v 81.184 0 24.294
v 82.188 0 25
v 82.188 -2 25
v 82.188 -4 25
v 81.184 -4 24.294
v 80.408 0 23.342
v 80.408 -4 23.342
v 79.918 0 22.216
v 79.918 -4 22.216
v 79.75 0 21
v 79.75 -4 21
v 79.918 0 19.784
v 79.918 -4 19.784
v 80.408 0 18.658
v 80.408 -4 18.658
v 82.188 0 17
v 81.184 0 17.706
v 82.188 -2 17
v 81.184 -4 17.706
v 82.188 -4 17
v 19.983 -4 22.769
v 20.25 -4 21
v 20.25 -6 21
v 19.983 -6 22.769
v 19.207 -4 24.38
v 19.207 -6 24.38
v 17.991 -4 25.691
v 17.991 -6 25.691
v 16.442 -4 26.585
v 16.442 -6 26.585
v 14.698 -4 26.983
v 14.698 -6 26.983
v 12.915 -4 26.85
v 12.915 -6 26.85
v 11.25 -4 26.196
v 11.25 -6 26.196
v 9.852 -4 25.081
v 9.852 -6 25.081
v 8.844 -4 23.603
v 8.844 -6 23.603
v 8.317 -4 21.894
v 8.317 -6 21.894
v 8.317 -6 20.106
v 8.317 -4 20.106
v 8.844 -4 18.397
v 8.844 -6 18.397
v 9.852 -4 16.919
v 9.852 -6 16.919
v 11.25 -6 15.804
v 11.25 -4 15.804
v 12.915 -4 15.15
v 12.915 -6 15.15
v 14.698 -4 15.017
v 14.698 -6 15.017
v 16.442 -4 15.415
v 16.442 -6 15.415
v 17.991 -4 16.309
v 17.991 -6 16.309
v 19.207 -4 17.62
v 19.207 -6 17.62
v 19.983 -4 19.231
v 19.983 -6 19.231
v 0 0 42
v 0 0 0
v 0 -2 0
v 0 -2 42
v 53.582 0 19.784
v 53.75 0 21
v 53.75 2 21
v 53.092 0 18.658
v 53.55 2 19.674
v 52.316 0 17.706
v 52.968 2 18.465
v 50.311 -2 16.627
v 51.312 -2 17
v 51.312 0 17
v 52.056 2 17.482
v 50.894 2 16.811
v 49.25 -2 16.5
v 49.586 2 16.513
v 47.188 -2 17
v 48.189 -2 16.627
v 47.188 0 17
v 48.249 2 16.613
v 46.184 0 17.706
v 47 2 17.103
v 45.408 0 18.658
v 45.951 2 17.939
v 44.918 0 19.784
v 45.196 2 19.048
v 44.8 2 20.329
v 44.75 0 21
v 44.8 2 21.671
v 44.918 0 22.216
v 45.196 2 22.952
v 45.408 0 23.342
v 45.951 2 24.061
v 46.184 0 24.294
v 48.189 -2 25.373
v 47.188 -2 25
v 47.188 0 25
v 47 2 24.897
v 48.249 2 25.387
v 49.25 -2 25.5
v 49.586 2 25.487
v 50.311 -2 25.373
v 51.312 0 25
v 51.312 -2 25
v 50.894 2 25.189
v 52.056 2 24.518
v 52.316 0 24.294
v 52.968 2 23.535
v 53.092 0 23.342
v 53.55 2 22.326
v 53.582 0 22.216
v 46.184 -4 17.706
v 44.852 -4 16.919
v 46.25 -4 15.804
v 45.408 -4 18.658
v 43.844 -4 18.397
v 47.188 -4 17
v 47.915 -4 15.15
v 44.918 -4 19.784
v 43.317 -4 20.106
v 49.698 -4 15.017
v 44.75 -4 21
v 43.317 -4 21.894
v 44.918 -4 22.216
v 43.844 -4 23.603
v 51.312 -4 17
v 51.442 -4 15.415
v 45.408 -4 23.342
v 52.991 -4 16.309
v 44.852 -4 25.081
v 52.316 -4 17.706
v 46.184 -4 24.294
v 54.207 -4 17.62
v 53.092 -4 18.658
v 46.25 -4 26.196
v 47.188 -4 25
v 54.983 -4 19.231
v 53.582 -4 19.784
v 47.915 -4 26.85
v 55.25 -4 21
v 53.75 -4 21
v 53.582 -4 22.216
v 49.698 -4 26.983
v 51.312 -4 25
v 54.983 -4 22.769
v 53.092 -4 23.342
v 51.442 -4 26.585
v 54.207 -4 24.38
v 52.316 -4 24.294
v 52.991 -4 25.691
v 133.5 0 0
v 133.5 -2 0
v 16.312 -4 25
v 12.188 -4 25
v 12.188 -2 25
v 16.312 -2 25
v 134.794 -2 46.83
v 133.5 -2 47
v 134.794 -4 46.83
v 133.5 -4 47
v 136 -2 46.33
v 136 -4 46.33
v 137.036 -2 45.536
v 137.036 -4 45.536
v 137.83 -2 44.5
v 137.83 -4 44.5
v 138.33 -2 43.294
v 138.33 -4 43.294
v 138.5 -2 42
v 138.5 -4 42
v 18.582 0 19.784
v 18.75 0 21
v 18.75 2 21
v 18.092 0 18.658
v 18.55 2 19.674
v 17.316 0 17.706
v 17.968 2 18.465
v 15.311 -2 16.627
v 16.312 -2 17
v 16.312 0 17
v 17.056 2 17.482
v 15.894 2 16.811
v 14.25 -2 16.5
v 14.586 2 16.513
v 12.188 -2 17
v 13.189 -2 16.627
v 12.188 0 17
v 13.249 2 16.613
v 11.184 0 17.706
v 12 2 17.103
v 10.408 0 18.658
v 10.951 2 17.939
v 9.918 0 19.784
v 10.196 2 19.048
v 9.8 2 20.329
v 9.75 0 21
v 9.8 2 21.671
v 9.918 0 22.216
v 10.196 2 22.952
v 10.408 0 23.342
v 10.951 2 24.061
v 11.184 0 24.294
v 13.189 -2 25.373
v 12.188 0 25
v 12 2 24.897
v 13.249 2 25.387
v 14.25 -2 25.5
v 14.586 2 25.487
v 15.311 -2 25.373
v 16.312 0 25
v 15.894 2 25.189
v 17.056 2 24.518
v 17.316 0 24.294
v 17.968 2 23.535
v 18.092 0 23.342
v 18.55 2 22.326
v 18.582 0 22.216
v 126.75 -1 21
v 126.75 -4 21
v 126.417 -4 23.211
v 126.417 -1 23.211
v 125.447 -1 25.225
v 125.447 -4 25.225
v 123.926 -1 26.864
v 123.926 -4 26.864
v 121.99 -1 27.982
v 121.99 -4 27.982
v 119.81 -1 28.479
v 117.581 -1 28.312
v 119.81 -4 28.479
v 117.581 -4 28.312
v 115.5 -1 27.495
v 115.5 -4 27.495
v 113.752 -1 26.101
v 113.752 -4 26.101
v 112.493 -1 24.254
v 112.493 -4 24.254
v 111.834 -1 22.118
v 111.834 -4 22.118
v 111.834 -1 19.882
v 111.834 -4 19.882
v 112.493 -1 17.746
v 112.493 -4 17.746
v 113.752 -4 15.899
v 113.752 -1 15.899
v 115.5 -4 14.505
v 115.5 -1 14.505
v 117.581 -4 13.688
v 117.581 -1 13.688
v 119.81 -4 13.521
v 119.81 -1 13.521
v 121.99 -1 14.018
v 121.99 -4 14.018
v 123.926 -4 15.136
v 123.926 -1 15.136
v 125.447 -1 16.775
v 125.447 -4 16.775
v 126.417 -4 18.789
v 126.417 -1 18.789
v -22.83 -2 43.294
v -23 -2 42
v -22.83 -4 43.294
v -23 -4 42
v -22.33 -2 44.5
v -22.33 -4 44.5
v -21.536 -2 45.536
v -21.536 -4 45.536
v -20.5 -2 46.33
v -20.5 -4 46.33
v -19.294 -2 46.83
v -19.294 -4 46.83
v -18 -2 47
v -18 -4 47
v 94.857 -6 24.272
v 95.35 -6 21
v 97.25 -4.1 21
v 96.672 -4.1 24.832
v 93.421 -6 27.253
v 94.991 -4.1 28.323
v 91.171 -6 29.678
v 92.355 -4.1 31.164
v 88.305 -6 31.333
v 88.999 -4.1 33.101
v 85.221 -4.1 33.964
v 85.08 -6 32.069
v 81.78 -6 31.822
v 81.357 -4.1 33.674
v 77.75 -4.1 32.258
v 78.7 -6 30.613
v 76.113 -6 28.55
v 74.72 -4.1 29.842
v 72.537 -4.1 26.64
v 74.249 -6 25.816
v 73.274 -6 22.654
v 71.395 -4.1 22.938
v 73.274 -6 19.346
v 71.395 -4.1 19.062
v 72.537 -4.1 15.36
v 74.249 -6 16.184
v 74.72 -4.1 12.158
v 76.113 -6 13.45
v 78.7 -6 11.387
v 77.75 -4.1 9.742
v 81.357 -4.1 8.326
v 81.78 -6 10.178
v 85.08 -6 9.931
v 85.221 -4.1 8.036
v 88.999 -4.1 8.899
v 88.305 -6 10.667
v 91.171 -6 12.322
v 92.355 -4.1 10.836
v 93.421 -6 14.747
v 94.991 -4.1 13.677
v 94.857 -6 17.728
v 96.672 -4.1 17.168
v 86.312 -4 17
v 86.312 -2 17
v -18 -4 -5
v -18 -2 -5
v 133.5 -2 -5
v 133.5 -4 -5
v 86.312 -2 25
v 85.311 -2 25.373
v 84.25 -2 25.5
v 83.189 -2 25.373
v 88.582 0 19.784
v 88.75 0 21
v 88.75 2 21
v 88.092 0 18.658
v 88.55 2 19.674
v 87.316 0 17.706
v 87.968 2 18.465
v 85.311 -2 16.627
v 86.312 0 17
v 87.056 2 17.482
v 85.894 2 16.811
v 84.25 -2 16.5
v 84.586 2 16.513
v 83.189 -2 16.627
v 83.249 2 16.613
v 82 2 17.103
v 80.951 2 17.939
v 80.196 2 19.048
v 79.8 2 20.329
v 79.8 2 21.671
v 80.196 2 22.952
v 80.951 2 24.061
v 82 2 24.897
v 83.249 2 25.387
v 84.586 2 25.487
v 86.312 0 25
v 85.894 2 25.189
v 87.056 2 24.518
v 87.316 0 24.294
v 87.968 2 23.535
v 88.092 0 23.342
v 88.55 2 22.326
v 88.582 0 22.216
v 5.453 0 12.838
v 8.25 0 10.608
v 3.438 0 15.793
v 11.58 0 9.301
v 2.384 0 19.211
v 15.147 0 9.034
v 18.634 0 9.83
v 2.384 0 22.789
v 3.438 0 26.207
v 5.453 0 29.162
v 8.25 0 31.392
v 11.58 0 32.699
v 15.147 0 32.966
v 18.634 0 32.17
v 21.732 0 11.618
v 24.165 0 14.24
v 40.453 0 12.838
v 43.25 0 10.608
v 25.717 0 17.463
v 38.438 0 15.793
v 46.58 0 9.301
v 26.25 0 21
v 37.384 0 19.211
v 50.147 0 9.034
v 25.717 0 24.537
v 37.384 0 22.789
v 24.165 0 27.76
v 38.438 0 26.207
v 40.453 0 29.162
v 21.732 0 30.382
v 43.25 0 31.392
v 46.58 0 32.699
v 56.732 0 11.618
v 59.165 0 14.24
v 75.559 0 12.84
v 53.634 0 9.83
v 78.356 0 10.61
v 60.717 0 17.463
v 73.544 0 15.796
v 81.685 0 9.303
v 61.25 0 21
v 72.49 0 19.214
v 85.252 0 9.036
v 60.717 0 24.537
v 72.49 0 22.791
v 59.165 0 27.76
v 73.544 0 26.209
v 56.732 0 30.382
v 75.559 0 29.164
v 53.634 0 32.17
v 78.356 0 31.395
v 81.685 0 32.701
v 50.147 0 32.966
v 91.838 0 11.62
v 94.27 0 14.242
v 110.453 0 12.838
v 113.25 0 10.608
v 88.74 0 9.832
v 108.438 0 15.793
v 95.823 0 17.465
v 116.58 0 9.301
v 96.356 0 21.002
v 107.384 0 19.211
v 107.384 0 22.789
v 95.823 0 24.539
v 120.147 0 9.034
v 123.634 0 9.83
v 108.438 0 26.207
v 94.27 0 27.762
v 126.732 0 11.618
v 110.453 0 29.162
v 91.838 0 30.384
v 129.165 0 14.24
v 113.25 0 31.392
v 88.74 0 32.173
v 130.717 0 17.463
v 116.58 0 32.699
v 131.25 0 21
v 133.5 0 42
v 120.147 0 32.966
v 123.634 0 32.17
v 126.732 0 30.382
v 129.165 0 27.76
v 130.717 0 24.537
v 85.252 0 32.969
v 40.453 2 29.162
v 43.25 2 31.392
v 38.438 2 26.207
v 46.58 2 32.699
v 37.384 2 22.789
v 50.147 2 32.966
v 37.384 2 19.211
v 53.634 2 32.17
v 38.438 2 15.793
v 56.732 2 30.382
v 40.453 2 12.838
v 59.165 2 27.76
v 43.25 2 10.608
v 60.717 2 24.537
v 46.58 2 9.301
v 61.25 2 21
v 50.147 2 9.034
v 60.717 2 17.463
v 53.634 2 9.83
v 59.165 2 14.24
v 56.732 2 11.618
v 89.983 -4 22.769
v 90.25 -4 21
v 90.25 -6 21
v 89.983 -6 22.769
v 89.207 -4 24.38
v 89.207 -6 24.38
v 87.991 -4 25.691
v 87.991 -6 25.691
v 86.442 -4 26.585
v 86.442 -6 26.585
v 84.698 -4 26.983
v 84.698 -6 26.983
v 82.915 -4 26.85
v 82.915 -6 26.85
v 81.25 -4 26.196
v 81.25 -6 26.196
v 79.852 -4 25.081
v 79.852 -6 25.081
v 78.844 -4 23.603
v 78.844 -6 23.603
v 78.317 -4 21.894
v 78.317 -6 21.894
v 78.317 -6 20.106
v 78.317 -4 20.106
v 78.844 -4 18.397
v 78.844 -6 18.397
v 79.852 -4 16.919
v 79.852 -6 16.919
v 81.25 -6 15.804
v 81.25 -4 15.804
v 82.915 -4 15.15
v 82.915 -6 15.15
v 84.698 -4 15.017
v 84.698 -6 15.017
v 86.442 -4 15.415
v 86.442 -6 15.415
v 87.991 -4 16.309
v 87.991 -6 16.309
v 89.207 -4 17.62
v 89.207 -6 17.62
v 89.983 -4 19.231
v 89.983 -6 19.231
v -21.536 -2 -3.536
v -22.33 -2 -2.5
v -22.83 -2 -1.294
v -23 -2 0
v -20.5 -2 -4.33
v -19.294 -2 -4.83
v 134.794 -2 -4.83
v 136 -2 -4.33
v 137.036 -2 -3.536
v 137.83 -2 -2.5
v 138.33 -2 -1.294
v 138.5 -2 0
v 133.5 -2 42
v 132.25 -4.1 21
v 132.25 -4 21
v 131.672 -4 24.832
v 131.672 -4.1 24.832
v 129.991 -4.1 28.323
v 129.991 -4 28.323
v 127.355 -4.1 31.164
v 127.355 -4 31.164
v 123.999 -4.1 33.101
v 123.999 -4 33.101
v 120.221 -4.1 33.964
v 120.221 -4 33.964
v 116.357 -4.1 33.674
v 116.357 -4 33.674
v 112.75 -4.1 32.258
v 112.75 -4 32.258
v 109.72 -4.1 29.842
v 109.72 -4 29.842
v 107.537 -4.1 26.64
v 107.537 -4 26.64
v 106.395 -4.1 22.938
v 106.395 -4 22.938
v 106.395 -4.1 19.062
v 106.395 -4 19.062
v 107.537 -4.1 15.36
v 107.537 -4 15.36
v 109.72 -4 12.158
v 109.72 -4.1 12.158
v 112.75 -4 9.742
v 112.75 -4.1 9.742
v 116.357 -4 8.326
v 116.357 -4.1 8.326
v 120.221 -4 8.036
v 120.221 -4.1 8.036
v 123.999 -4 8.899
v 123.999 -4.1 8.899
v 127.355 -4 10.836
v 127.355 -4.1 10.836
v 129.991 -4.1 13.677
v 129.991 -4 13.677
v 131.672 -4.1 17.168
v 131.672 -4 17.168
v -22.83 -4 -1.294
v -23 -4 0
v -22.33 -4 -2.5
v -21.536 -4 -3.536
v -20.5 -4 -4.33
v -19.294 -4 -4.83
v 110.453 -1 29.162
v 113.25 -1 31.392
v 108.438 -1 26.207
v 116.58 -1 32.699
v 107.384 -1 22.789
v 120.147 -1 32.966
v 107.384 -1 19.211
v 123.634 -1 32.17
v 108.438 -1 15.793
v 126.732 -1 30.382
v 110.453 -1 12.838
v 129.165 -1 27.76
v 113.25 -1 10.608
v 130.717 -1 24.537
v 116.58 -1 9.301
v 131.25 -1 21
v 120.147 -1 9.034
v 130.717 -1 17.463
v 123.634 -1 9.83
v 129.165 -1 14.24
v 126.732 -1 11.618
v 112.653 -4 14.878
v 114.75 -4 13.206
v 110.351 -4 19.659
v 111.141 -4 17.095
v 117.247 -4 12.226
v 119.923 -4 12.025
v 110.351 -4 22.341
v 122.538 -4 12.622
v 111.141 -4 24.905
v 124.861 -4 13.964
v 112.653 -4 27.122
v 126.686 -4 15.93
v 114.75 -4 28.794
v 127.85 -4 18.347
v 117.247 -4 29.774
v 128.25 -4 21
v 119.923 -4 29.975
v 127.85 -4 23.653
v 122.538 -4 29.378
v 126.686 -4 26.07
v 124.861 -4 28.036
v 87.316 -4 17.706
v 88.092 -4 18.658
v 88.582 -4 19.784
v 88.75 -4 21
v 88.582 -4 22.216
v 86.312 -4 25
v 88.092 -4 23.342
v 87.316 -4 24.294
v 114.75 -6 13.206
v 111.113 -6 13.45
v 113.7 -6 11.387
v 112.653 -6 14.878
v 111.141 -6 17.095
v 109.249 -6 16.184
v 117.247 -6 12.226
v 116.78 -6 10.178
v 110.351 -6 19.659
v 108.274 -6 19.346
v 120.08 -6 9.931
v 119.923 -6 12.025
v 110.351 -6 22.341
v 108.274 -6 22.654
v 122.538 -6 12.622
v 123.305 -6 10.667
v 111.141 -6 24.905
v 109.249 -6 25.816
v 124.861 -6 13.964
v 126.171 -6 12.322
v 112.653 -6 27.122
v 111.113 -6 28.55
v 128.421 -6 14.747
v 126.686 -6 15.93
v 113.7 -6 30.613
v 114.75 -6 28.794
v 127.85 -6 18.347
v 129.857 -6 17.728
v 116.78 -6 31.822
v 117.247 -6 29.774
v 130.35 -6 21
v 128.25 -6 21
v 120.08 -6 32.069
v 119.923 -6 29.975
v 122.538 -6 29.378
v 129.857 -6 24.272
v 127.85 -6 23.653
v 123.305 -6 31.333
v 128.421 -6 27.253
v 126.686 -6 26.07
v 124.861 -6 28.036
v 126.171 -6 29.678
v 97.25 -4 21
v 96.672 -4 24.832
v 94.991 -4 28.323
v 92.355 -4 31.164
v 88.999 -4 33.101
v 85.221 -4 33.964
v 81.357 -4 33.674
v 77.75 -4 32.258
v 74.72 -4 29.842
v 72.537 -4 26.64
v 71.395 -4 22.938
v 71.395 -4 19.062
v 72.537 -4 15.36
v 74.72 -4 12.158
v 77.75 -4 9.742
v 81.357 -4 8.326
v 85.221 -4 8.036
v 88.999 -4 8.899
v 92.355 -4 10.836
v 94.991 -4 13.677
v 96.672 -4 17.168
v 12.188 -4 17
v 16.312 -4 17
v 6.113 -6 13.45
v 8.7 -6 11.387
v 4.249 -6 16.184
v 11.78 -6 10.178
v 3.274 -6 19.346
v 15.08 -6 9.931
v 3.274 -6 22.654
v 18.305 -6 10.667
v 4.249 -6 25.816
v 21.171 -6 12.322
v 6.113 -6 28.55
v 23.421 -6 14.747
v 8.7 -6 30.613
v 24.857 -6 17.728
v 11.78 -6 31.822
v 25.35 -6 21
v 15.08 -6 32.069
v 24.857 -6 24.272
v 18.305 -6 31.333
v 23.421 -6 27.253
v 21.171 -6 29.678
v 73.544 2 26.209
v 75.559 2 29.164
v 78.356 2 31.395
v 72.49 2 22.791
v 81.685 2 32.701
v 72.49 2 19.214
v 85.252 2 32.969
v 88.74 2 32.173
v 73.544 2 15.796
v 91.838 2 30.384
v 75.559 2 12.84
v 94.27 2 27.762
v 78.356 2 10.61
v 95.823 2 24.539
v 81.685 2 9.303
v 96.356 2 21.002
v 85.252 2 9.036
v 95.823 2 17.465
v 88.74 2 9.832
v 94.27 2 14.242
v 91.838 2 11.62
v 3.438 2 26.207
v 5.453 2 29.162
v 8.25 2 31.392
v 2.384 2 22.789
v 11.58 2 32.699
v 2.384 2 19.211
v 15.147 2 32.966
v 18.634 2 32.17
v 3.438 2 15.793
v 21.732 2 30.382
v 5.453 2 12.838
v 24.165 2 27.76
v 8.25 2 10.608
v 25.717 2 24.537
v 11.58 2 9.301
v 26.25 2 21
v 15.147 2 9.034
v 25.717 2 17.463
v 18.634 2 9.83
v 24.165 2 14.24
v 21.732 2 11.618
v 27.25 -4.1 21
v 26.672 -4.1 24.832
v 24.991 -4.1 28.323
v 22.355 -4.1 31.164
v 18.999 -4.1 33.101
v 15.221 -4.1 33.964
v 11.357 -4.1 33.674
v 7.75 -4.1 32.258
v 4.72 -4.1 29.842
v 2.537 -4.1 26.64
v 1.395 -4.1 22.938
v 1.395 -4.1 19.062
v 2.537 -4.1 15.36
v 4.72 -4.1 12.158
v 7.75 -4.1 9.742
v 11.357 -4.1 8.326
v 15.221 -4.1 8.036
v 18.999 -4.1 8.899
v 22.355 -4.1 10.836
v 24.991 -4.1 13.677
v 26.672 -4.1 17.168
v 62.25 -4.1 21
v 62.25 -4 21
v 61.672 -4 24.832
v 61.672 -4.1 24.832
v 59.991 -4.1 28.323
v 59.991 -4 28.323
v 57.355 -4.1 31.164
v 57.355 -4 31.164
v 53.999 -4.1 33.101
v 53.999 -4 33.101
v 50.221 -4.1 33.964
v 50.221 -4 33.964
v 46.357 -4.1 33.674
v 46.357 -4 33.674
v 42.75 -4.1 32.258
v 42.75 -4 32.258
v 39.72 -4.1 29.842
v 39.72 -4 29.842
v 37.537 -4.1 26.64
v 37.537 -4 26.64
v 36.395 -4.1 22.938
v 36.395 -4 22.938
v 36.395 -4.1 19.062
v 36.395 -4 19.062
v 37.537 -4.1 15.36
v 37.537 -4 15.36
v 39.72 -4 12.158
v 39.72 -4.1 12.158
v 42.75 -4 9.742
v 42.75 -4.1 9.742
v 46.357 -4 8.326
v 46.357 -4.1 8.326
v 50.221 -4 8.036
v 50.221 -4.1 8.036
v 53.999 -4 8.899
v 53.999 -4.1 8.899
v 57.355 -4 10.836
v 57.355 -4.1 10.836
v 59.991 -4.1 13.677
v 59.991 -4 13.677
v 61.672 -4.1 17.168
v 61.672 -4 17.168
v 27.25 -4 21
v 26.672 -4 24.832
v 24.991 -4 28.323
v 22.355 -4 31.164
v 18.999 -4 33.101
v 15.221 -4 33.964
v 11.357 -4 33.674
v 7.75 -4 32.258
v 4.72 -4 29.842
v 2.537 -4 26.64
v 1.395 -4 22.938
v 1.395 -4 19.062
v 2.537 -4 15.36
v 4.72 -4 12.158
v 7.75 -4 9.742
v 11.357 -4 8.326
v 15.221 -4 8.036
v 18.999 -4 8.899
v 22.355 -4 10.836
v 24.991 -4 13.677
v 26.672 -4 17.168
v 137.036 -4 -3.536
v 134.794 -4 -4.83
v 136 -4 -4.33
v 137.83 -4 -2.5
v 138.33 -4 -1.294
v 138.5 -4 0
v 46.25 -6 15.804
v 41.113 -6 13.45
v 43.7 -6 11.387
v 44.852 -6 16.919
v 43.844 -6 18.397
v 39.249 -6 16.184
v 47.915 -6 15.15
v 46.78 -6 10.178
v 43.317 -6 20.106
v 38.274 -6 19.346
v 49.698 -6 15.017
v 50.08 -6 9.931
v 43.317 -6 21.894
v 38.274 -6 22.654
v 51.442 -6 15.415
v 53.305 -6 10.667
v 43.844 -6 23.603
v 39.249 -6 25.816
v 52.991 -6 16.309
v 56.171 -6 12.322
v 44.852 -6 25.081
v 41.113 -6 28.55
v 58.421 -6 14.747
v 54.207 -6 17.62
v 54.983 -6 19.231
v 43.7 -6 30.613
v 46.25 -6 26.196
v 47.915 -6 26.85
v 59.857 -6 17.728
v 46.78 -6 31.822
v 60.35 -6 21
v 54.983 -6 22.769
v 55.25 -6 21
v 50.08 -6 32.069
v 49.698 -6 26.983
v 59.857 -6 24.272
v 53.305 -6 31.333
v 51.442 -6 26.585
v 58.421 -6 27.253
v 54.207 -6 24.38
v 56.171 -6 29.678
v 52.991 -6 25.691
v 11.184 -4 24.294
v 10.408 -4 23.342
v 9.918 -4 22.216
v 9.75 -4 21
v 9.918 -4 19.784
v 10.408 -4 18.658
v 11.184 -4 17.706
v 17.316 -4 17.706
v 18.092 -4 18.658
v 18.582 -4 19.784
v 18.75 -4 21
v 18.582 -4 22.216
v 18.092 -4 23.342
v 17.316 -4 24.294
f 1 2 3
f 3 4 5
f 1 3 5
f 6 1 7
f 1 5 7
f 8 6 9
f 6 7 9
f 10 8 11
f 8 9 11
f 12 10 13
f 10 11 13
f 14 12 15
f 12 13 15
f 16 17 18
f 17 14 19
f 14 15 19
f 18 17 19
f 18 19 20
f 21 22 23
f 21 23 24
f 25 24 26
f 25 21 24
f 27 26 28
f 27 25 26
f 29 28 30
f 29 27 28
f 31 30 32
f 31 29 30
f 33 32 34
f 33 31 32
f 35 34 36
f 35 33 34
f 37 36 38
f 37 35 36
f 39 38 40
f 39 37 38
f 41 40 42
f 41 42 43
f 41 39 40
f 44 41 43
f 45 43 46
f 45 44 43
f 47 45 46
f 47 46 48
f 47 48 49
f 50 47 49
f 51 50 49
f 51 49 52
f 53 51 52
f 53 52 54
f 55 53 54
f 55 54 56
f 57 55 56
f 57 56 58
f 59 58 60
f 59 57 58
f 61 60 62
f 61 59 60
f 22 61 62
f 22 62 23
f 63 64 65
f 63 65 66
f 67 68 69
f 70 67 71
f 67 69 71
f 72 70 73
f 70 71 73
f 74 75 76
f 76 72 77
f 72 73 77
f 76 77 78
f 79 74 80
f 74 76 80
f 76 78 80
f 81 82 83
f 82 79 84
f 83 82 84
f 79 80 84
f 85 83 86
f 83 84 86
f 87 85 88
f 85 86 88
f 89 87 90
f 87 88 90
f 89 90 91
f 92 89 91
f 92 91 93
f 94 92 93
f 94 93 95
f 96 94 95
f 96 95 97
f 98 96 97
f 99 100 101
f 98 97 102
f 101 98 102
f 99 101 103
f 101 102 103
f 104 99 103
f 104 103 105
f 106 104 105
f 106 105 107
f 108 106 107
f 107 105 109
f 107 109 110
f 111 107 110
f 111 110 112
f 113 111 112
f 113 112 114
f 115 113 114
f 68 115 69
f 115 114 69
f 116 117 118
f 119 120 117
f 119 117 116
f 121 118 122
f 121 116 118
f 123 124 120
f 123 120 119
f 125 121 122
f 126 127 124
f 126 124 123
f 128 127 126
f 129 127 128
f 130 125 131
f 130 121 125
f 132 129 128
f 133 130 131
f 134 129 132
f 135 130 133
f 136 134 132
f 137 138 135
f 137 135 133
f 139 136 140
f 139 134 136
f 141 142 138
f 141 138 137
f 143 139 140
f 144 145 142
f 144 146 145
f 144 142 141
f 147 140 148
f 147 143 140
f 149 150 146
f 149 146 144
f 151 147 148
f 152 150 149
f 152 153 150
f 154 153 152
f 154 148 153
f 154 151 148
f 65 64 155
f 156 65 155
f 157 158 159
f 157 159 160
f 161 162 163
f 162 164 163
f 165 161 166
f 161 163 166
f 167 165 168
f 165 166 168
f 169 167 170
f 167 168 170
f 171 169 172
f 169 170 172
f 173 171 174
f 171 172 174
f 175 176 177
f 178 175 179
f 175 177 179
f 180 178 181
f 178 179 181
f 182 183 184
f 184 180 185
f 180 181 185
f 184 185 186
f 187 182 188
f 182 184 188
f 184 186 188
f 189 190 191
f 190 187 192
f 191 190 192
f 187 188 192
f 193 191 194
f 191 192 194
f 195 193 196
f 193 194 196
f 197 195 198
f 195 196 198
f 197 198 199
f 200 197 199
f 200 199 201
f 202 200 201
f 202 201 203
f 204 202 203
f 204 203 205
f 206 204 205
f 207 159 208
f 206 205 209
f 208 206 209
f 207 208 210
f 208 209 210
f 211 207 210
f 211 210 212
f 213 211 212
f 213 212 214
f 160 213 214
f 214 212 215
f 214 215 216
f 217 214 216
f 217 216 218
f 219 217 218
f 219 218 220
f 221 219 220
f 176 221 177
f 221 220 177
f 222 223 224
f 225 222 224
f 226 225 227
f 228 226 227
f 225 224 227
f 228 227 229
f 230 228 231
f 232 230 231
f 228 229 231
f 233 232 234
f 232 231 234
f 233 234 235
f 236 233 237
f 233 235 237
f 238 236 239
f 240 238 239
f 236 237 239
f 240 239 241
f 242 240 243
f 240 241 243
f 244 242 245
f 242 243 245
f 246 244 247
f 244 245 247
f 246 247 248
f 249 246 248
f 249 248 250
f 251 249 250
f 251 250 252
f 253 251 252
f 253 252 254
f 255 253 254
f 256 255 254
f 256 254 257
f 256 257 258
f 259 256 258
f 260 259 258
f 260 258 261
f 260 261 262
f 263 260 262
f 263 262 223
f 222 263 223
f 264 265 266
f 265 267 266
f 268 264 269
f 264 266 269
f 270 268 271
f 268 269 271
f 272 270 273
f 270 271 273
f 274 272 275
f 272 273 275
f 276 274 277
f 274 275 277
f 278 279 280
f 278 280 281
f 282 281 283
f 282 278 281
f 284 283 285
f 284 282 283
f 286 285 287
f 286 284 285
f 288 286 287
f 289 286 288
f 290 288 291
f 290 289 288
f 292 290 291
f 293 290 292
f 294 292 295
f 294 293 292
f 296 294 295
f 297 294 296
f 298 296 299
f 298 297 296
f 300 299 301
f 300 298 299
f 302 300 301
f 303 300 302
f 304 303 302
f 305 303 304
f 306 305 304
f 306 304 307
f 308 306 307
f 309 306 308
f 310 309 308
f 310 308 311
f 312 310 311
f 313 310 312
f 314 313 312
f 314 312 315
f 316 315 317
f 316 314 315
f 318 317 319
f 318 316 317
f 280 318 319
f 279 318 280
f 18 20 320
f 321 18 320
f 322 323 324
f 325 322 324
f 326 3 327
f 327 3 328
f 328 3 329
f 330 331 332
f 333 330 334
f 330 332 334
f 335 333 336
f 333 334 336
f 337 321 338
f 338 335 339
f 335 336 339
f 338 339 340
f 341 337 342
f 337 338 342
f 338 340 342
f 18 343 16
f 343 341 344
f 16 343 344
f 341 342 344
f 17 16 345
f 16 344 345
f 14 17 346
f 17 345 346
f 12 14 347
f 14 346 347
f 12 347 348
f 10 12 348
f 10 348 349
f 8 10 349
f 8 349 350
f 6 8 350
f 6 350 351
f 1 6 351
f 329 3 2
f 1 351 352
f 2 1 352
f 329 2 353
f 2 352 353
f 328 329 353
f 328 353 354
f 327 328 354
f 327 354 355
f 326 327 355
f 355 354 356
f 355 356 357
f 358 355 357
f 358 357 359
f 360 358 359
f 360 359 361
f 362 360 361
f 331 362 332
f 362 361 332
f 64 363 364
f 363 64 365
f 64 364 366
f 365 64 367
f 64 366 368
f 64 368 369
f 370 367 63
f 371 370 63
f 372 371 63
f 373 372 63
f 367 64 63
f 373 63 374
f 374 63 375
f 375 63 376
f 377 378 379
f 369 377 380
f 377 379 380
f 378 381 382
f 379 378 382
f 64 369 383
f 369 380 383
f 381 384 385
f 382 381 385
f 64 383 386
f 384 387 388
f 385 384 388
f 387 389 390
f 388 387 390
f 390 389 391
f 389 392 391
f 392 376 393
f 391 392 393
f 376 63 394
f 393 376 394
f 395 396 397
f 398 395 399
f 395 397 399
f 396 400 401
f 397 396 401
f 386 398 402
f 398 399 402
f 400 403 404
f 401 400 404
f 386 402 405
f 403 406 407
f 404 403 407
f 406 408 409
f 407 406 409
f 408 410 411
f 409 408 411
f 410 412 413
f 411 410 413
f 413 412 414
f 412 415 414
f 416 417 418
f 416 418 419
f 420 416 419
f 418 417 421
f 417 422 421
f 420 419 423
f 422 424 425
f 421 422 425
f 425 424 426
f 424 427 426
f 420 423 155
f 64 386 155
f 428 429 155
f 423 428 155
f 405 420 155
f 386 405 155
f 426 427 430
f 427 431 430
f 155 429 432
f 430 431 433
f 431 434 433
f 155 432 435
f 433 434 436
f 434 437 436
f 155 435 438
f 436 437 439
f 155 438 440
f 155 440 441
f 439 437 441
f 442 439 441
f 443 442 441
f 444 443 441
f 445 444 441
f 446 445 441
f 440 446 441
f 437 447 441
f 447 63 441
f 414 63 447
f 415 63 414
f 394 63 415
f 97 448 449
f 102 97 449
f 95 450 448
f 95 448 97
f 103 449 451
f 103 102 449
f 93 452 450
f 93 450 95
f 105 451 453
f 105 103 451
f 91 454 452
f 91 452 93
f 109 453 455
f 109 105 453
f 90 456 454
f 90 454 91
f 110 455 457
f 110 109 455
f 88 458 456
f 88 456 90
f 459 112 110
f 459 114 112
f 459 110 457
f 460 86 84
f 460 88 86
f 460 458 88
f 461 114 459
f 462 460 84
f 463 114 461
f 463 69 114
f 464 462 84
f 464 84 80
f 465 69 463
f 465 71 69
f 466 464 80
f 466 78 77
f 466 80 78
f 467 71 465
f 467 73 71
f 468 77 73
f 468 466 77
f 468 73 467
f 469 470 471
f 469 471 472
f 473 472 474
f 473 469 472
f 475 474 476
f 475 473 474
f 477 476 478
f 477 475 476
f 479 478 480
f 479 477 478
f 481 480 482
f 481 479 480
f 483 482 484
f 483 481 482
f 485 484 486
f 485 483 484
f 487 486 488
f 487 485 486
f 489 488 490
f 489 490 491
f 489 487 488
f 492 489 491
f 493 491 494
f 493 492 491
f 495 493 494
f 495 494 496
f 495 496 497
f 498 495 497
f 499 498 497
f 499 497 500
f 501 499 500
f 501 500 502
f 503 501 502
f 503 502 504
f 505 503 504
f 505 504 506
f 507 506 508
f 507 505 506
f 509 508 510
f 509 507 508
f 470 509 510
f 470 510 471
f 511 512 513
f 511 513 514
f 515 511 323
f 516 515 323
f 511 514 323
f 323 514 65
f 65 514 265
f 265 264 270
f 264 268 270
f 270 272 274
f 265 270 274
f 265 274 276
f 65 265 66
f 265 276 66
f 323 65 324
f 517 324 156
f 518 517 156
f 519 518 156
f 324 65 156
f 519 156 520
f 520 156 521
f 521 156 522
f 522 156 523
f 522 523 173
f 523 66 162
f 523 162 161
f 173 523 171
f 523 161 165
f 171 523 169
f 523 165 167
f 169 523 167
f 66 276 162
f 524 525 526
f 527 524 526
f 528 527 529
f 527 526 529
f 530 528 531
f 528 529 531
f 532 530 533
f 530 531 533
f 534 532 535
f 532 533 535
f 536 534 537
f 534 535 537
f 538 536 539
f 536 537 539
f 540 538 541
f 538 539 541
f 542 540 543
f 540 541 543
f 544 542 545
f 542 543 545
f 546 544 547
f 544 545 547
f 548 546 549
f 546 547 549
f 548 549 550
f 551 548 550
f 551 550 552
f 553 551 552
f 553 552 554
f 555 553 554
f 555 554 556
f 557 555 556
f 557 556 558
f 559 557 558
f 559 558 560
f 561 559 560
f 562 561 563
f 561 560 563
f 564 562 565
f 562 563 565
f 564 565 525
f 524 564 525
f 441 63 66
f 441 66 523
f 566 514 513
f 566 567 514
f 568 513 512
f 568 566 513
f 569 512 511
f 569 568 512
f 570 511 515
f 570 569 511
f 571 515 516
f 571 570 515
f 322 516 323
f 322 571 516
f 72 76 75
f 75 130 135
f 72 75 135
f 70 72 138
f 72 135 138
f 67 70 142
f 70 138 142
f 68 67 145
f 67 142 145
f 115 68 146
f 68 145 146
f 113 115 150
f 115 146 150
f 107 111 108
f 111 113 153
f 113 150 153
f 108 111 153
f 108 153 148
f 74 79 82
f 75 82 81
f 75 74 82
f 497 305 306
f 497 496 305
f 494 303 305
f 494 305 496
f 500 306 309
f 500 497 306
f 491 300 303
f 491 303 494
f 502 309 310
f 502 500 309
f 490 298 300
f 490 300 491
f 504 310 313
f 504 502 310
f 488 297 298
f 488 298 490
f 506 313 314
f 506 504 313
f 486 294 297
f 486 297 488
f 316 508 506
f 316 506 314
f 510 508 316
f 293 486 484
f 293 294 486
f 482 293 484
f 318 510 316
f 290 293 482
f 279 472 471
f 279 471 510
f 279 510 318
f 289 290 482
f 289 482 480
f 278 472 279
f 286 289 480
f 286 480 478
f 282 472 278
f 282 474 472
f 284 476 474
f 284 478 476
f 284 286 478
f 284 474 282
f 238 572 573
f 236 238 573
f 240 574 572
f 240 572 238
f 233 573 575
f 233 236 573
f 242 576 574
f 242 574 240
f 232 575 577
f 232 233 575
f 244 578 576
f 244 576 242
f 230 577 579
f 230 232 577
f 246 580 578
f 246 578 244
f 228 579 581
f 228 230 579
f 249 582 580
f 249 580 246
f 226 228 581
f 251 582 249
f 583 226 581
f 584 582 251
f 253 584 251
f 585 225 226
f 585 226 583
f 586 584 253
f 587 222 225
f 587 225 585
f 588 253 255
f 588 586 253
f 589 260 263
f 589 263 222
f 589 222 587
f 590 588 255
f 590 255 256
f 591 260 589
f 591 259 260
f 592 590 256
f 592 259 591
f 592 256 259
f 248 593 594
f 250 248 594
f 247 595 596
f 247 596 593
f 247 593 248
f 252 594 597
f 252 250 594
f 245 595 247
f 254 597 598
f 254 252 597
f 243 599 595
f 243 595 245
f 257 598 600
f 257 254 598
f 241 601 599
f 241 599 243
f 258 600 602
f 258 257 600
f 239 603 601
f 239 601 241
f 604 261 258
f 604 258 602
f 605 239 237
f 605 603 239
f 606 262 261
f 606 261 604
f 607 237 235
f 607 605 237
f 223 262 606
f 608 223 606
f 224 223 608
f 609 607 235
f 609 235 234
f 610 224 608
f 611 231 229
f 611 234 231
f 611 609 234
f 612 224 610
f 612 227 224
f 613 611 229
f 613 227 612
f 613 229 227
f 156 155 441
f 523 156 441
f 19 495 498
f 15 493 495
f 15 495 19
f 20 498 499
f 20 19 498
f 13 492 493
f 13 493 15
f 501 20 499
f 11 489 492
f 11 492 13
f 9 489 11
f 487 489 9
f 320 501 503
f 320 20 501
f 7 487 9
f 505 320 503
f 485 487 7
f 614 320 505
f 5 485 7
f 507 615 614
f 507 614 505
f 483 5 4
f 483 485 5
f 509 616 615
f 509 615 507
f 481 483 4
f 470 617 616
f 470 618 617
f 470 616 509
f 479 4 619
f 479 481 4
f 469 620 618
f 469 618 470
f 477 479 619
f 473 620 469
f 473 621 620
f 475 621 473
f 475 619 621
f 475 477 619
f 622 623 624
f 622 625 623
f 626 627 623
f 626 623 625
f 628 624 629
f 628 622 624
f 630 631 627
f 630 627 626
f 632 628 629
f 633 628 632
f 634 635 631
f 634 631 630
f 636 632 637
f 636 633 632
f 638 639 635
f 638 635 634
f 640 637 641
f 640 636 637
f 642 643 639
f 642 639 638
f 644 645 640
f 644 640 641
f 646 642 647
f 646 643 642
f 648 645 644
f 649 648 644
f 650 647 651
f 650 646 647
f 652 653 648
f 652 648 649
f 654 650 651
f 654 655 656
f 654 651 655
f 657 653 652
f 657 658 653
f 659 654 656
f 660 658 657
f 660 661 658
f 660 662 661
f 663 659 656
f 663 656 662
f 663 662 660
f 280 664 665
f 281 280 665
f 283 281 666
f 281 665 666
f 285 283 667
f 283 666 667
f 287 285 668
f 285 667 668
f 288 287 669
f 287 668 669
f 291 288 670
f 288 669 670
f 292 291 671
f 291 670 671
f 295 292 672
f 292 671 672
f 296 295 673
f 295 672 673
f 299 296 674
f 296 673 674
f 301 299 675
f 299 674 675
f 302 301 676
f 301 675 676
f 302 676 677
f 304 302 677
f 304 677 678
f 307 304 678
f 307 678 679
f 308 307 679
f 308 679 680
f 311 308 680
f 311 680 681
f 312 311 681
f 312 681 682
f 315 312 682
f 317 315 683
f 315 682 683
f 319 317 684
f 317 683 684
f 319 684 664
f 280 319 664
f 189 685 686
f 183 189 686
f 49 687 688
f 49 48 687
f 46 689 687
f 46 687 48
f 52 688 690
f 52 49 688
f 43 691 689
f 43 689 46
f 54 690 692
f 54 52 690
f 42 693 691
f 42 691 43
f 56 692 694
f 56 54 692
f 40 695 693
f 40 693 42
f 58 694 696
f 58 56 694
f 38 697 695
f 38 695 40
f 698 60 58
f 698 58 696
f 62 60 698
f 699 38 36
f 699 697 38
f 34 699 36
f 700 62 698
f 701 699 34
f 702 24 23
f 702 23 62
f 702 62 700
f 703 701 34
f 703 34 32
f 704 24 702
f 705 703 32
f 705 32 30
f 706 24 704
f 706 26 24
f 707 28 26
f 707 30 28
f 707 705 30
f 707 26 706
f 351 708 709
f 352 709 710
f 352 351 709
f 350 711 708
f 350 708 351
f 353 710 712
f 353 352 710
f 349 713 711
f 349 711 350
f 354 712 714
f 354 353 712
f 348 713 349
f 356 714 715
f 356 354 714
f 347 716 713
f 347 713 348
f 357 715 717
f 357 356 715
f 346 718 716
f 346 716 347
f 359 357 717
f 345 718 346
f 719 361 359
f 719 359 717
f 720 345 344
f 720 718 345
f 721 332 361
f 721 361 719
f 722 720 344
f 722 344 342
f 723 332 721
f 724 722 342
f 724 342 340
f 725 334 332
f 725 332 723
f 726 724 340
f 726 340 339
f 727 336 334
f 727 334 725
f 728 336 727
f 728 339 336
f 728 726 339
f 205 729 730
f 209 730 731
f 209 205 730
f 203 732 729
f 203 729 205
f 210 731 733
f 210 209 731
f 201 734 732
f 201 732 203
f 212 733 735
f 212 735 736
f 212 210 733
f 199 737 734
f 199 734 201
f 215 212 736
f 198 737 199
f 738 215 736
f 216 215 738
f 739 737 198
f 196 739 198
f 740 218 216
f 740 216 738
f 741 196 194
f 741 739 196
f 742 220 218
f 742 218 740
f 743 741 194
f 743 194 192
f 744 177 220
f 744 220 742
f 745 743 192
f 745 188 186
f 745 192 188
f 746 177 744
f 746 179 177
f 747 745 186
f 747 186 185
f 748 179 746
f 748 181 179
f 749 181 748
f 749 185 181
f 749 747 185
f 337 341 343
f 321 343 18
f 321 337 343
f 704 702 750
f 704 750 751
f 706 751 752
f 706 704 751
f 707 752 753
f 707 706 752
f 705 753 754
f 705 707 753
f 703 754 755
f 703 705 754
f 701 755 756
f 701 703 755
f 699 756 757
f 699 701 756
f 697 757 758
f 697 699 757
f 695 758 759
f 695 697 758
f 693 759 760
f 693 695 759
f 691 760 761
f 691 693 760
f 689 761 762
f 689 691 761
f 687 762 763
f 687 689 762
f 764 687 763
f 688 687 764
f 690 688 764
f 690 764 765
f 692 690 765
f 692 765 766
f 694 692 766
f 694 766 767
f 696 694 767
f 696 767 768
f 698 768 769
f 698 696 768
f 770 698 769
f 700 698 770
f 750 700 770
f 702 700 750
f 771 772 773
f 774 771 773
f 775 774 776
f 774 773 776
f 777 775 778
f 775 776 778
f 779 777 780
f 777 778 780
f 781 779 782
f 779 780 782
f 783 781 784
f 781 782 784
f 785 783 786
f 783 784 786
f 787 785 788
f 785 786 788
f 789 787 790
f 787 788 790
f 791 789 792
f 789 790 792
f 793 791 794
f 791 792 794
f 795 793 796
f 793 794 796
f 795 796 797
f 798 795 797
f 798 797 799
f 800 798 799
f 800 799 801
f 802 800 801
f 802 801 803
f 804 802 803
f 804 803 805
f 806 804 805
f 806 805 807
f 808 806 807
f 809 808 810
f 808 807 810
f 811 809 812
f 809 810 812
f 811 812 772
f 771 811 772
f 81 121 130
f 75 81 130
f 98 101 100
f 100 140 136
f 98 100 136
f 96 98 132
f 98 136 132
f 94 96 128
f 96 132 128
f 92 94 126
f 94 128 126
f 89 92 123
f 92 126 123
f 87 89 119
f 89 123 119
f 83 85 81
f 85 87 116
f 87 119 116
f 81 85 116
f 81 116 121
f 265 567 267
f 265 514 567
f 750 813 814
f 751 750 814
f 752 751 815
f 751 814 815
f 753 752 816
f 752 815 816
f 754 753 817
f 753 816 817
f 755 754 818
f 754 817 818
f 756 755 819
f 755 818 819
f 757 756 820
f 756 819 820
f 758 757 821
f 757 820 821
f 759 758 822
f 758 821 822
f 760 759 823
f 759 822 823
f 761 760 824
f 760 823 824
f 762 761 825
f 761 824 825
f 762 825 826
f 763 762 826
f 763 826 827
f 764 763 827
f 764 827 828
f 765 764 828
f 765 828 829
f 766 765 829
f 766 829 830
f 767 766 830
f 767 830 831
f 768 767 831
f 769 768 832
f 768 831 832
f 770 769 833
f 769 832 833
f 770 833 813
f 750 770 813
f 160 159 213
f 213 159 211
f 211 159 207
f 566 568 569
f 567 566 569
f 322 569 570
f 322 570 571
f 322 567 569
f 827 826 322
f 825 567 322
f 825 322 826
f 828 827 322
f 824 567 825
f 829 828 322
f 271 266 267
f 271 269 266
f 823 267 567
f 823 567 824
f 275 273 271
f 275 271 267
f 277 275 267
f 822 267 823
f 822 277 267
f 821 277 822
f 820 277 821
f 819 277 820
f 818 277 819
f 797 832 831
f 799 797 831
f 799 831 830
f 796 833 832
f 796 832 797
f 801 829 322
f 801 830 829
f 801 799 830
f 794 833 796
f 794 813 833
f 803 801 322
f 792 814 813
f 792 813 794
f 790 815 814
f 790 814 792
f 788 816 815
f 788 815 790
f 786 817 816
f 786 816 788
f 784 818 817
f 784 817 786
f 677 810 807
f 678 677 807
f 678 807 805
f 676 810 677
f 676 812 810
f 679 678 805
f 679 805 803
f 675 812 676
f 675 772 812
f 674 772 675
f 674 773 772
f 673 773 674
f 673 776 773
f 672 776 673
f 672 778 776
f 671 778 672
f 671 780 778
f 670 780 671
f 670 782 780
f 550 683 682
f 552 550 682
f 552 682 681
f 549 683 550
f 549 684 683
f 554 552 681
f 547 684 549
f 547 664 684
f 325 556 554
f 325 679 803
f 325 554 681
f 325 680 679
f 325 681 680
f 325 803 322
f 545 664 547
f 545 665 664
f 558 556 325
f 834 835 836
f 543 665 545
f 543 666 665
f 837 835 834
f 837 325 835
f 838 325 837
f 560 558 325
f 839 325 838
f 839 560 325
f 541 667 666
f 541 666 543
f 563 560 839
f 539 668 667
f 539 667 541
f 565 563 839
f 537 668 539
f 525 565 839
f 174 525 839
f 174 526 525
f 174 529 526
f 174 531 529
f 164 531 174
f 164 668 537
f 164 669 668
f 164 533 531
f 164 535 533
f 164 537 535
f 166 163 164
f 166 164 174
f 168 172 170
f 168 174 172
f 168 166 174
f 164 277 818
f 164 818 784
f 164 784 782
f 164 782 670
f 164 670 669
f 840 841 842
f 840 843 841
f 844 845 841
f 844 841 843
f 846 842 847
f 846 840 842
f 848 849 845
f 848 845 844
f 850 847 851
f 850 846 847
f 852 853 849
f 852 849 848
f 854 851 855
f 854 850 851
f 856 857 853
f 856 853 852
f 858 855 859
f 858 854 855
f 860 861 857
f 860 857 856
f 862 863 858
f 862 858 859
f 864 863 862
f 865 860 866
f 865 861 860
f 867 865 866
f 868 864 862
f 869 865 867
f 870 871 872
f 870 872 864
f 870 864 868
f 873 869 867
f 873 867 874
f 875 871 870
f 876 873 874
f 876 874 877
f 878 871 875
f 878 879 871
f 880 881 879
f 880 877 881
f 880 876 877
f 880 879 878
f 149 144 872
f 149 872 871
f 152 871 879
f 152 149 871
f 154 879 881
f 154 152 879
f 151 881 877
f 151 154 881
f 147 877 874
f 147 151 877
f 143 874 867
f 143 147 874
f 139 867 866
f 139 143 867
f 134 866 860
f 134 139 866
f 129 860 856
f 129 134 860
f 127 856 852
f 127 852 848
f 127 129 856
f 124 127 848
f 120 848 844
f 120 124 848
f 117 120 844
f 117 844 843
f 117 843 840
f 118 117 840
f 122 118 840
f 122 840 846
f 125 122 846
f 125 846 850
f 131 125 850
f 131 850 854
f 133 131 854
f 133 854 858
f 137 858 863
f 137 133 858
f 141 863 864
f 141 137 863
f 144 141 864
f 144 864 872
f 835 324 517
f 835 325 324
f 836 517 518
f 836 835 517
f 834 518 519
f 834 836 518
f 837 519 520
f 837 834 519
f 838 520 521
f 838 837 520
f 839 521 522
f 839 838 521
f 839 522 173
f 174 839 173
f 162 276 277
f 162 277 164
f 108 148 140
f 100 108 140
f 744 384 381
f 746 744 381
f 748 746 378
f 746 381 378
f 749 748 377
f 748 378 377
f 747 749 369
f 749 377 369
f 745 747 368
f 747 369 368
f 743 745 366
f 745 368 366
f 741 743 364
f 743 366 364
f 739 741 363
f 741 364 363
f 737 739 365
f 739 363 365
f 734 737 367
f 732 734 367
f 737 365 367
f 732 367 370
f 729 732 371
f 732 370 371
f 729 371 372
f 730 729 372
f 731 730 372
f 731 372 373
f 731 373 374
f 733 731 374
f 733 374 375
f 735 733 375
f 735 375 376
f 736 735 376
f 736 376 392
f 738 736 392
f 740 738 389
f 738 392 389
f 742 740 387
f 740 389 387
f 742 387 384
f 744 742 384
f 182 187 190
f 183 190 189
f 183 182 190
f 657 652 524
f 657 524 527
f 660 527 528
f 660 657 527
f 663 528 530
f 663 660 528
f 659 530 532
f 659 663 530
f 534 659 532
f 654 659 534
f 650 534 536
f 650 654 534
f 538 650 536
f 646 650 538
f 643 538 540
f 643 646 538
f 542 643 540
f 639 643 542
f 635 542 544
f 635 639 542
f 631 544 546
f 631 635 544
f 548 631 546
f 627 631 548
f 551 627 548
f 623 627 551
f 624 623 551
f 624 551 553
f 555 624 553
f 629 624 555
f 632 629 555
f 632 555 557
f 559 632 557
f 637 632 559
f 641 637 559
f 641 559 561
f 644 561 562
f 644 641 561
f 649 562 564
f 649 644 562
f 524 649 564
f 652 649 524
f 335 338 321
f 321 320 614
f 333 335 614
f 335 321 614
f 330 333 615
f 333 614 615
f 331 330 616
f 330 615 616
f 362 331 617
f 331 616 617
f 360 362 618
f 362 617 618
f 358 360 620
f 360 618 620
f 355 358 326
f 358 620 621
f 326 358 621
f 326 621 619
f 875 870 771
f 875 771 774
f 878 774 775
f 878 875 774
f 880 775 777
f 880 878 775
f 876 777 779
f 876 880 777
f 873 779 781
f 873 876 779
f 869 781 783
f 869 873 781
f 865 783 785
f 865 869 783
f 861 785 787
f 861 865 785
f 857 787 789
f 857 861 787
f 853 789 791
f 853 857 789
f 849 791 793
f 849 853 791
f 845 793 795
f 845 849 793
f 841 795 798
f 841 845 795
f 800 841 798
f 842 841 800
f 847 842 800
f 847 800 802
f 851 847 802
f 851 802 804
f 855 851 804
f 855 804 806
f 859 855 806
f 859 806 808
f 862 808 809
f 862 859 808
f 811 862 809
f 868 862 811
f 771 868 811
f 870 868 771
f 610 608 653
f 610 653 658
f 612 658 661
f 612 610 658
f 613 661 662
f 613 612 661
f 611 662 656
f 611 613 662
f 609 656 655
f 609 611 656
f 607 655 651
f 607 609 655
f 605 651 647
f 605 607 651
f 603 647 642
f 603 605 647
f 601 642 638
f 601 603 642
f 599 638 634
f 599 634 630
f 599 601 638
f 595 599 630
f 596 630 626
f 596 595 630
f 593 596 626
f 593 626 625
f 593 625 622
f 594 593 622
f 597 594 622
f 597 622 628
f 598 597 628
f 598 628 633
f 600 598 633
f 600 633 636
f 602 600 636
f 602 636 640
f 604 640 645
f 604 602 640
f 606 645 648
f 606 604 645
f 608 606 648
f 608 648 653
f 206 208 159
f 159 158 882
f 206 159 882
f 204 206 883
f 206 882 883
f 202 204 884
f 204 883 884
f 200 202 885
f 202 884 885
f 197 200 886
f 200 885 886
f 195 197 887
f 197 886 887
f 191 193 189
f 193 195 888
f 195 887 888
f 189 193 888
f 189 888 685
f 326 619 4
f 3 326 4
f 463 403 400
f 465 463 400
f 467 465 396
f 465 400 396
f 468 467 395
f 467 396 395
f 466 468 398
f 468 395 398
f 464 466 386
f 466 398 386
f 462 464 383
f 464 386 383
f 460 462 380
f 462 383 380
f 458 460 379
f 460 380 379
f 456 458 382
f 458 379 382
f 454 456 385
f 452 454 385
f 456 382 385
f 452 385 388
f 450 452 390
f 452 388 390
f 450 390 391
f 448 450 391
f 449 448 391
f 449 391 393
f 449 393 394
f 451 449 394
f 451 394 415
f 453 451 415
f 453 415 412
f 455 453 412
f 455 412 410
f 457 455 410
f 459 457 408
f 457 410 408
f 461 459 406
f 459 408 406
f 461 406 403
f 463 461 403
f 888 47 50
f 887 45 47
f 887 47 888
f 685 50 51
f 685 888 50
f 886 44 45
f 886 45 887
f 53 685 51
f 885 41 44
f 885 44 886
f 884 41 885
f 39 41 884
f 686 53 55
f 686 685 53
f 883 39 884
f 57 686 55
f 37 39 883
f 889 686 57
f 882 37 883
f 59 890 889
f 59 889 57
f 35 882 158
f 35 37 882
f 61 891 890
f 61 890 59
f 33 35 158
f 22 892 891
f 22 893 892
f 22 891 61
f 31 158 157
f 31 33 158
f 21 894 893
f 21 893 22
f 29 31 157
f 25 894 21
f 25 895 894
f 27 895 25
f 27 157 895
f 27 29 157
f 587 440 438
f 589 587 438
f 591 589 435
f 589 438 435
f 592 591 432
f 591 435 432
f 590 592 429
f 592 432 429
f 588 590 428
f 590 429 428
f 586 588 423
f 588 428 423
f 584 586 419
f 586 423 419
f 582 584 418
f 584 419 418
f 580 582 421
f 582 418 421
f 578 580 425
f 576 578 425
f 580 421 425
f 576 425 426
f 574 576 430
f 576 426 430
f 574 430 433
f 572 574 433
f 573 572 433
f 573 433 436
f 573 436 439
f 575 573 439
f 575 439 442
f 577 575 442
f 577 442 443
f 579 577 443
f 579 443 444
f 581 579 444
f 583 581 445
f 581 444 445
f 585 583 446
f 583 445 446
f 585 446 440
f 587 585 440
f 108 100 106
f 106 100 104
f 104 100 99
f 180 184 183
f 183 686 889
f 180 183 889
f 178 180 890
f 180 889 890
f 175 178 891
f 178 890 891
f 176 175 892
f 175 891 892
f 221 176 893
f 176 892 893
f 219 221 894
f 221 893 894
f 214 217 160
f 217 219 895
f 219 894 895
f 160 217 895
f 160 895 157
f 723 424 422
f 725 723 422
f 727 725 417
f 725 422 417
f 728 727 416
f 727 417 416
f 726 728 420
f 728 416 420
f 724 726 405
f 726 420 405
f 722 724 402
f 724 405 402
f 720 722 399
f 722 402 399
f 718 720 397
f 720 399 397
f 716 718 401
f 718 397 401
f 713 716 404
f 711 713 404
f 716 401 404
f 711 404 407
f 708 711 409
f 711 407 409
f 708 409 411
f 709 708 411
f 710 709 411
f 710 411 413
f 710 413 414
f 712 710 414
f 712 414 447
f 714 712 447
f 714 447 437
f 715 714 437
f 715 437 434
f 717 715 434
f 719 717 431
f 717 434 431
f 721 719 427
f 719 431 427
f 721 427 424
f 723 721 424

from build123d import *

# Parameters (mm, degrees)
SKETCH_W               = 133.5
SKETCH_H               = 42
PAD_DEPTH              = 2
SKETCH001_W            = 161.5
SKETCH001_H            = 52
PAD001_DEPTH           = 2
SKETCH002_R            = 7.5
POCKET_DEPTH           = 4.001
SKETCH003_R            = 12
POCKET001_DEPTH        = 1
SKETCH004_R            = 12
PAD002_DEPTH           = 2
SKETCH005_R            = 4.5
POCKET002_DEPTH        = 4
LINEARPATTERN_COUNT    = 3
LINEARPATTERN_PITCH    = 35
SKETCH006_R            = 13
SKETCH006_R_2          = 6
PAD003_DEPTH           = 2
LINEARPATTERN001_COUNT = 3
LINEARPATTERN001_PITCH = 35
CHAMFER_SIZE           = 1.9
FILLET_R               = 5
SKETCH007_R            = 13
SKETCH007_R_2          = 9
PAD004_DEPTH           = 2
CHAMFER001_SIZE        = 1.9


with BuildPart() as part:
    # Sketch → Pad (new body)
    with BuildSketch(Plane.XZ):
        with Locations((66.75, 21)):
            Rectangle(SKETCH_W, SKETCH_H)
    extrude(amount=PAD_DEPTH)

    # Sketch001 (on Face6 of Pad) → Pad001 (join)
    with BuildSketch(Plane.XZ.offset(2)):
        with Locations((57.75, 21)):
            Rectangle(SKETCH001_W, SKETCH001_H)
    extrude(amount=PAD001_DEPTH)

    # Sketch002 (on Face11 of Pad001) → Pocket (cut, through all)
    with BuildSketch(Plane.XZ.offset(4)):
        with Locations((119.25, 21)):
            Circle(SKETCH002_R)
        with BuildLine():
            ThreePointArc((12.188447, 25), (9.75, 21), (12.188447, 17))
            Line((12.188447, 17), (16.311553, 17))
            ThreePointArc((16.311553, 17), (18.75, 21), (16.311553, 25))
            Line((12.188447, 25), (16.311553, 25))
        make_face()
        with BuildLine():
            ThreePointArc((47.188447, 25), (44.75, 21), (47.188447, 17))
            Line((47.188447, 17), (51.311553, 17))
            ThreePointArc((51.311553, 17), (53.75, 21), (51.311553, 25))
            Line((51.311553, 25), (47.188447, 25))
        make_face()
        with BuildLine():
            Line((82.188447, 17), (86.311553, 17))
            ThreePointArc((86.311553, 17), (88.75, 21), (86.311553, 25))
            Line((86.311553, 25), (82.188447, 25))
            ThreePointArc((82.188447, 25), (79.75, 21), (82.188447, 17))
        make_face()
    extrude(amount=-POCKET_DEPTH, mode=Mode.SUBTRACT)

    # Sketch003 (on Face1 of Pocket) → Pocket001 (cut)
    with BuildSketch(Plane(origin=(0, 0, 0), x_dir=(1, 0, 0), z_dir=(0, 1, 0))):
        with Locations((119.25, -21)):
            Circle(SKETCH003_R)
    extrude(amount=-POCKET001_DEPTH, mode=Mode.SUBTRACT)

    # Sketch004 (on Face1 of Pocket001) → Pad002 (join)
    with BuildSketch(Plane(origin=(0, 0, 0), x_dir=(1, 0, 0), z_dir=(0, 1, 0))):
        with Locations((84.355629, -21.002337)):
            Circle(SKETCH004_R)
        with Locations((49.25, -21)):
            Circle(SKETCH004_R)
        with Locations((14.25, -21.000002)):
            Circle(SKETCH004_R)
    extrude(amount=PAD002_DEPTH)

    # Sketch005 (on Face17 of Pad002) → Pocket002 (cut)
    with BuildSketch(Plane(origin=(0, 2, 0), x_dir=(1, 0, 0), z_dir=(0, 1, 0))):
        with Locations((14.25, -21)):
            Circle(SKETCH005_R)
        with Locations((49.25, -21)):
            Circle(SKETCH005_R)
        with Locations((84.25, -21)):
            Circle(SKETCH005_R)
    pocket002 = extrude(amount=-POCKET002_DEPTH, mode=Mode.SUBTRACT)

    # LinearPattern: Pocket002 ×3
    with Locations(*[(-i * LINEARPATTERN_PITCH, 0, 0) for i in range(1, LINEARPATTERN_COUNT)]):
        add(pocket002, mode=Mode.SUBTRACT)

    # Sketch006 (on Face19 of LinearPattern) → Pad003 (join)
    with BuildSketch(Plane.XZ.offset(4)):
        with Locations((84.25, 21)):
            Circle(SKETCH006_R)
        with Locations((84.25, 21)):
            Circle(SKETCH006_R_2, mode=Mode.SUBTRACT)
    pad003 = extrude(amount=PAD003_DEPTH)

    # LinearPattern001: Pad003 ×3
    with Locations(*[(-i * LINEARPATTERN001_PITCH, 0, 0) for i in range(1, LINEARPATTERN001_COUNT)]):
        add(pad003)

    # Chamfer
    chamfer_edges = [part.edges().sort_by_distance(p)[0] for p in [
        (1.25, -6, 21),
        (36.25, -6, 21),
        (71.25, -6, 21),
    ]]
    chamfer(chamfer_edges, length=CHAMFER_SIZE)

    # Fillet
    fillet_edges = [part.edges().sort_by_distance(p)[0] for p in [
        (-23, -3, -5),
        (-23, -3, 47),
        (138.5, -3, -5),
        (138.5, -3, 47),
    ]]
    fillet(fillet_edges, radius=FILLET_R)

    # Sketch007 (on Face1 of Fillet) → Pad004 (join)
    with BuildSketch(Plane.XZ.offset(4)):
        with Locations((119.25, 21)):
            Circle(SKETCH007_R)
        with Locations((119.25, 21)):
            Circle(SKETCH007_R_2, mode=Mode.SUBTRACT)
    extrude(amount=PAD004_DEPTH)

    # Chamfer001
    chamfer001_edges = [part.edges().sort_by_distance(p)[0] for p in [
        (106.25, -6, 21),
    ]]
    chamfer(chamfer001_edges, length=CHAMFER001_SIZE)


solid = part.part
